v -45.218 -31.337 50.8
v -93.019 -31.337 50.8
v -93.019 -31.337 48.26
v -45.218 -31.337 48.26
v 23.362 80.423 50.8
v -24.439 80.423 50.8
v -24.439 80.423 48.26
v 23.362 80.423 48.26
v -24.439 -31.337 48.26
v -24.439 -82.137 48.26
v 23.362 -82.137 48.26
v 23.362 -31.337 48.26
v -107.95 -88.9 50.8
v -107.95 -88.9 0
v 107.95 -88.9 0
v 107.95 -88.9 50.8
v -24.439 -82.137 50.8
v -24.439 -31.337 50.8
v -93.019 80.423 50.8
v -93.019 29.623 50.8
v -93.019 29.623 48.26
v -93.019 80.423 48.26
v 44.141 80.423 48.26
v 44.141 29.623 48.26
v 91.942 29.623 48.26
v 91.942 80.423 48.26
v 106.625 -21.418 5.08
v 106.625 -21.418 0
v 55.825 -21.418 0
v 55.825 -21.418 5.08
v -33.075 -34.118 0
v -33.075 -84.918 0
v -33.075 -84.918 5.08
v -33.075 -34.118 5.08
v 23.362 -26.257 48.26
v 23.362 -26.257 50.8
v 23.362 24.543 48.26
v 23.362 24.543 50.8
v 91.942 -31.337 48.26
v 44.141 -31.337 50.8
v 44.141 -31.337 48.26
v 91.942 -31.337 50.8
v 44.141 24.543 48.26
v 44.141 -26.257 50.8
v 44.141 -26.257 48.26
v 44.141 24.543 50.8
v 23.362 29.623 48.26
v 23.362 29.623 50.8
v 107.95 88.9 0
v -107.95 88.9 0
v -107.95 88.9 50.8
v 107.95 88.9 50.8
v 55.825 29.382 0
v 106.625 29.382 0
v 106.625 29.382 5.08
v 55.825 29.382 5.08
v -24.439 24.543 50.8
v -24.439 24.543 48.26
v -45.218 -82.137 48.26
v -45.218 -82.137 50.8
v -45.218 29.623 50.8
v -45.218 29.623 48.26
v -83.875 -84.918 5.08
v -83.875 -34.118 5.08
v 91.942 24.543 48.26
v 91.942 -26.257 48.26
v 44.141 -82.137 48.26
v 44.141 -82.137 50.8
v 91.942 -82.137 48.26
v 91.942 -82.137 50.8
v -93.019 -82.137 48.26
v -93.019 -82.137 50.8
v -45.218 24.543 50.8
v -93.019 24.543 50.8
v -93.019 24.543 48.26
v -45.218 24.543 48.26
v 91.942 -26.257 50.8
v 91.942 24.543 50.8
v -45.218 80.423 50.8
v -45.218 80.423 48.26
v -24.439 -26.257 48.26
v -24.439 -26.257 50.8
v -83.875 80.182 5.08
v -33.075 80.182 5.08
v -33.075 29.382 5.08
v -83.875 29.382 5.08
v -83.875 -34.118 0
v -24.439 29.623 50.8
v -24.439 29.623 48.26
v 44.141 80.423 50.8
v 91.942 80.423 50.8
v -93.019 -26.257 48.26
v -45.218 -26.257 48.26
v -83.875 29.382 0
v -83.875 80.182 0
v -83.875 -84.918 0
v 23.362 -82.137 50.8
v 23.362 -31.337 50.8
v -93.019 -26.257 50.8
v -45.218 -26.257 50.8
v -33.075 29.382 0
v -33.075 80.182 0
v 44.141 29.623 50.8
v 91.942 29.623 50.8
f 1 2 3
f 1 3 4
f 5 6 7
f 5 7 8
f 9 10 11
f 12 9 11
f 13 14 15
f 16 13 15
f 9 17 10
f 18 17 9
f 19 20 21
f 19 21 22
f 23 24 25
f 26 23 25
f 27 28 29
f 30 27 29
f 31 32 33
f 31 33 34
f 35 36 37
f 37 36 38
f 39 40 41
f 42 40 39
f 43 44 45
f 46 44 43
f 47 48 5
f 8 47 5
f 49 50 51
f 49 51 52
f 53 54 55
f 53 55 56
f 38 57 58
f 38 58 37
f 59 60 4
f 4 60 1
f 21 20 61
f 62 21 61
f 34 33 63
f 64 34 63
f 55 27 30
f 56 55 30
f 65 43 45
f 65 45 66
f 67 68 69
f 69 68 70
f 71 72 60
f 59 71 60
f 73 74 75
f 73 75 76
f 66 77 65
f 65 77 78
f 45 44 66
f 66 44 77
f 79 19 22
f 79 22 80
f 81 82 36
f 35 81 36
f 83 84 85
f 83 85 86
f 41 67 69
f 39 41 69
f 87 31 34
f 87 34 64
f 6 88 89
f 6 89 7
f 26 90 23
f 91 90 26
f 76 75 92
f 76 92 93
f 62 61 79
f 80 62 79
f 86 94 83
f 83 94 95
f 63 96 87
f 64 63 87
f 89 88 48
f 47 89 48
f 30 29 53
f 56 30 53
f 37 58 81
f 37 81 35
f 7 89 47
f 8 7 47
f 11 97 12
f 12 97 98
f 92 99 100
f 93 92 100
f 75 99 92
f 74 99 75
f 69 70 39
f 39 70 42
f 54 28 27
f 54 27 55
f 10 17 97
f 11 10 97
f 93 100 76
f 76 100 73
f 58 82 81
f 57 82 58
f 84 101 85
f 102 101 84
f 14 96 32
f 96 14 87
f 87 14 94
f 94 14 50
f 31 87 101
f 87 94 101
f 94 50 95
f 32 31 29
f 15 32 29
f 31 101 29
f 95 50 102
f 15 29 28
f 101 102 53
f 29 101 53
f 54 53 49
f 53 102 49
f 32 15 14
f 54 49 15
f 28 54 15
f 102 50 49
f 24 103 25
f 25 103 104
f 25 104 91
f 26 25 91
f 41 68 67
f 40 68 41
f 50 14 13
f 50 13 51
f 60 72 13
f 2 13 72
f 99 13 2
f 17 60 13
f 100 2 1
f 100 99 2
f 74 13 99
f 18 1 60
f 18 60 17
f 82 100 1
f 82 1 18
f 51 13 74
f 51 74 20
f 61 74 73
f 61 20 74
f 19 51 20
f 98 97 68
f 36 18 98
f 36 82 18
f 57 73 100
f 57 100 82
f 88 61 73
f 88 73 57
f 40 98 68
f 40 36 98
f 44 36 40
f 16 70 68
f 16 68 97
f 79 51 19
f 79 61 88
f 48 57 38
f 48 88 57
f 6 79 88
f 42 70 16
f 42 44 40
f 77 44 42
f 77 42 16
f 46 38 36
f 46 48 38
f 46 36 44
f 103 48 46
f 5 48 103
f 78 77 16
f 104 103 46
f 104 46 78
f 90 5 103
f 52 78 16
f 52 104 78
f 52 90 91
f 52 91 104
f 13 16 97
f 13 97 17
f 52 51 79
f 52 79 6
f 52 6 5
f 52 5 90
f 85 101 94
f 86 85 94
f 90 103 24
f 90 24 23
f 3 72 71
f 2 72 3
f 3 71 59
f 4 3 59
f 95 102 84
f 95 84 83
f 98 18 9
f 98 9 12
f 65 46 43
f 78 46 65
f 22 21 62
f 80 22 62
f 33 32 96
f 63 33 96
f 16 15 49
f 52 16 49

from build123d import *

# Parameters (mm, degrees)
SKETCH1_W           = 215.9
SKETCH1_H           = 177.8
BOSS_EXTRUDE1_DEPTH = 50.8
SKETCH2_W           = 47.801549888
SKETCH2_H           = 50.8
CUT_EXTRUDE1_DEPTH  = 2.54
SKETCH3_W           = 50.8
SKETCH3_H           = 50.8
CUT_EXTRUDE2_DEPTH  = 5.08


with BuildPart() as part:
    # Sketch1 → Boss-Extrude1 (new body)
    with BuildSketch(Plane.XY):
        Rectangle(SKETCH1_W, SKETCH1_H)
    extrude(amount=BOSS_EXTRUDE1_DEPTH)

    # Sketch2 → Cut-Extrude1 (cut)
    with BuildSketch(Plane.XY.offset(50.8)):
        with Locations((-0.538457271, 55.022877852)):
            Rectangle(SKETCH2_W, SKETCH2_H)
        with Locations((-69.118457271, 55.022877852)):
            Rectangle(SKETCH2_W, SKETCH2_H)
        with Locations((68.041542729, 55.022877852)):
            Rectangle(SKETCH2_W, SKETCH2_H)
        with Locations((-69.118457271, -0.857122148)):
            Rectangle(SKETCH2_W, SKETCH2_H)
        with Locations((-0.538457271, -0.857122148)):
            Rectangle(SKETCH2_W, SKETCH2_H)
        with Locations((68.041542729, -0.857122148)):
            Rectangle(SKETCH2_W, SKETCH2_H)
        with Locations((-69.118457271, -56.737122148)):
            Rectangle(SKETCH2_W, SKETCH2_H)
        with Locations((-0.538457271, -56.737122148)):
            Rectangle(SKETCH2_W, SKETCH2_H)
        with Locations((68.041542729, -56.737122148)):
            Rectangle(SKETCH2_W, SKETCH2_H)
    extrude(amount=-CUT_EXTRUDE1_DEPTH, mode=Mode.SUBTRACT)

    # Sketch3 → Cut-Extrude2 (cut)
    with BuildSketch(Plane(origin=(0, 0, 0), x_dir=(-1, 0, 0), z_dir=(0, 0, -1))):
        with Locations((58.475064597, 54.782080131)):
            Rectangle(SKETCH3_W, SKETCH3_H)
        with Locations((58.475064597, -59.517919869)):
            Rectangle(SKETCH3_W, SKETCH3_H)
        with Locations((-81.224935403, 3.982080131)):
            Rectangle(SKETCH3_W, SKETCH3_H)
    extrude(amount=-CUT_EXTRUDE2_DEPTH, mode=Mode.SUBTRACT)


solid = part.part
